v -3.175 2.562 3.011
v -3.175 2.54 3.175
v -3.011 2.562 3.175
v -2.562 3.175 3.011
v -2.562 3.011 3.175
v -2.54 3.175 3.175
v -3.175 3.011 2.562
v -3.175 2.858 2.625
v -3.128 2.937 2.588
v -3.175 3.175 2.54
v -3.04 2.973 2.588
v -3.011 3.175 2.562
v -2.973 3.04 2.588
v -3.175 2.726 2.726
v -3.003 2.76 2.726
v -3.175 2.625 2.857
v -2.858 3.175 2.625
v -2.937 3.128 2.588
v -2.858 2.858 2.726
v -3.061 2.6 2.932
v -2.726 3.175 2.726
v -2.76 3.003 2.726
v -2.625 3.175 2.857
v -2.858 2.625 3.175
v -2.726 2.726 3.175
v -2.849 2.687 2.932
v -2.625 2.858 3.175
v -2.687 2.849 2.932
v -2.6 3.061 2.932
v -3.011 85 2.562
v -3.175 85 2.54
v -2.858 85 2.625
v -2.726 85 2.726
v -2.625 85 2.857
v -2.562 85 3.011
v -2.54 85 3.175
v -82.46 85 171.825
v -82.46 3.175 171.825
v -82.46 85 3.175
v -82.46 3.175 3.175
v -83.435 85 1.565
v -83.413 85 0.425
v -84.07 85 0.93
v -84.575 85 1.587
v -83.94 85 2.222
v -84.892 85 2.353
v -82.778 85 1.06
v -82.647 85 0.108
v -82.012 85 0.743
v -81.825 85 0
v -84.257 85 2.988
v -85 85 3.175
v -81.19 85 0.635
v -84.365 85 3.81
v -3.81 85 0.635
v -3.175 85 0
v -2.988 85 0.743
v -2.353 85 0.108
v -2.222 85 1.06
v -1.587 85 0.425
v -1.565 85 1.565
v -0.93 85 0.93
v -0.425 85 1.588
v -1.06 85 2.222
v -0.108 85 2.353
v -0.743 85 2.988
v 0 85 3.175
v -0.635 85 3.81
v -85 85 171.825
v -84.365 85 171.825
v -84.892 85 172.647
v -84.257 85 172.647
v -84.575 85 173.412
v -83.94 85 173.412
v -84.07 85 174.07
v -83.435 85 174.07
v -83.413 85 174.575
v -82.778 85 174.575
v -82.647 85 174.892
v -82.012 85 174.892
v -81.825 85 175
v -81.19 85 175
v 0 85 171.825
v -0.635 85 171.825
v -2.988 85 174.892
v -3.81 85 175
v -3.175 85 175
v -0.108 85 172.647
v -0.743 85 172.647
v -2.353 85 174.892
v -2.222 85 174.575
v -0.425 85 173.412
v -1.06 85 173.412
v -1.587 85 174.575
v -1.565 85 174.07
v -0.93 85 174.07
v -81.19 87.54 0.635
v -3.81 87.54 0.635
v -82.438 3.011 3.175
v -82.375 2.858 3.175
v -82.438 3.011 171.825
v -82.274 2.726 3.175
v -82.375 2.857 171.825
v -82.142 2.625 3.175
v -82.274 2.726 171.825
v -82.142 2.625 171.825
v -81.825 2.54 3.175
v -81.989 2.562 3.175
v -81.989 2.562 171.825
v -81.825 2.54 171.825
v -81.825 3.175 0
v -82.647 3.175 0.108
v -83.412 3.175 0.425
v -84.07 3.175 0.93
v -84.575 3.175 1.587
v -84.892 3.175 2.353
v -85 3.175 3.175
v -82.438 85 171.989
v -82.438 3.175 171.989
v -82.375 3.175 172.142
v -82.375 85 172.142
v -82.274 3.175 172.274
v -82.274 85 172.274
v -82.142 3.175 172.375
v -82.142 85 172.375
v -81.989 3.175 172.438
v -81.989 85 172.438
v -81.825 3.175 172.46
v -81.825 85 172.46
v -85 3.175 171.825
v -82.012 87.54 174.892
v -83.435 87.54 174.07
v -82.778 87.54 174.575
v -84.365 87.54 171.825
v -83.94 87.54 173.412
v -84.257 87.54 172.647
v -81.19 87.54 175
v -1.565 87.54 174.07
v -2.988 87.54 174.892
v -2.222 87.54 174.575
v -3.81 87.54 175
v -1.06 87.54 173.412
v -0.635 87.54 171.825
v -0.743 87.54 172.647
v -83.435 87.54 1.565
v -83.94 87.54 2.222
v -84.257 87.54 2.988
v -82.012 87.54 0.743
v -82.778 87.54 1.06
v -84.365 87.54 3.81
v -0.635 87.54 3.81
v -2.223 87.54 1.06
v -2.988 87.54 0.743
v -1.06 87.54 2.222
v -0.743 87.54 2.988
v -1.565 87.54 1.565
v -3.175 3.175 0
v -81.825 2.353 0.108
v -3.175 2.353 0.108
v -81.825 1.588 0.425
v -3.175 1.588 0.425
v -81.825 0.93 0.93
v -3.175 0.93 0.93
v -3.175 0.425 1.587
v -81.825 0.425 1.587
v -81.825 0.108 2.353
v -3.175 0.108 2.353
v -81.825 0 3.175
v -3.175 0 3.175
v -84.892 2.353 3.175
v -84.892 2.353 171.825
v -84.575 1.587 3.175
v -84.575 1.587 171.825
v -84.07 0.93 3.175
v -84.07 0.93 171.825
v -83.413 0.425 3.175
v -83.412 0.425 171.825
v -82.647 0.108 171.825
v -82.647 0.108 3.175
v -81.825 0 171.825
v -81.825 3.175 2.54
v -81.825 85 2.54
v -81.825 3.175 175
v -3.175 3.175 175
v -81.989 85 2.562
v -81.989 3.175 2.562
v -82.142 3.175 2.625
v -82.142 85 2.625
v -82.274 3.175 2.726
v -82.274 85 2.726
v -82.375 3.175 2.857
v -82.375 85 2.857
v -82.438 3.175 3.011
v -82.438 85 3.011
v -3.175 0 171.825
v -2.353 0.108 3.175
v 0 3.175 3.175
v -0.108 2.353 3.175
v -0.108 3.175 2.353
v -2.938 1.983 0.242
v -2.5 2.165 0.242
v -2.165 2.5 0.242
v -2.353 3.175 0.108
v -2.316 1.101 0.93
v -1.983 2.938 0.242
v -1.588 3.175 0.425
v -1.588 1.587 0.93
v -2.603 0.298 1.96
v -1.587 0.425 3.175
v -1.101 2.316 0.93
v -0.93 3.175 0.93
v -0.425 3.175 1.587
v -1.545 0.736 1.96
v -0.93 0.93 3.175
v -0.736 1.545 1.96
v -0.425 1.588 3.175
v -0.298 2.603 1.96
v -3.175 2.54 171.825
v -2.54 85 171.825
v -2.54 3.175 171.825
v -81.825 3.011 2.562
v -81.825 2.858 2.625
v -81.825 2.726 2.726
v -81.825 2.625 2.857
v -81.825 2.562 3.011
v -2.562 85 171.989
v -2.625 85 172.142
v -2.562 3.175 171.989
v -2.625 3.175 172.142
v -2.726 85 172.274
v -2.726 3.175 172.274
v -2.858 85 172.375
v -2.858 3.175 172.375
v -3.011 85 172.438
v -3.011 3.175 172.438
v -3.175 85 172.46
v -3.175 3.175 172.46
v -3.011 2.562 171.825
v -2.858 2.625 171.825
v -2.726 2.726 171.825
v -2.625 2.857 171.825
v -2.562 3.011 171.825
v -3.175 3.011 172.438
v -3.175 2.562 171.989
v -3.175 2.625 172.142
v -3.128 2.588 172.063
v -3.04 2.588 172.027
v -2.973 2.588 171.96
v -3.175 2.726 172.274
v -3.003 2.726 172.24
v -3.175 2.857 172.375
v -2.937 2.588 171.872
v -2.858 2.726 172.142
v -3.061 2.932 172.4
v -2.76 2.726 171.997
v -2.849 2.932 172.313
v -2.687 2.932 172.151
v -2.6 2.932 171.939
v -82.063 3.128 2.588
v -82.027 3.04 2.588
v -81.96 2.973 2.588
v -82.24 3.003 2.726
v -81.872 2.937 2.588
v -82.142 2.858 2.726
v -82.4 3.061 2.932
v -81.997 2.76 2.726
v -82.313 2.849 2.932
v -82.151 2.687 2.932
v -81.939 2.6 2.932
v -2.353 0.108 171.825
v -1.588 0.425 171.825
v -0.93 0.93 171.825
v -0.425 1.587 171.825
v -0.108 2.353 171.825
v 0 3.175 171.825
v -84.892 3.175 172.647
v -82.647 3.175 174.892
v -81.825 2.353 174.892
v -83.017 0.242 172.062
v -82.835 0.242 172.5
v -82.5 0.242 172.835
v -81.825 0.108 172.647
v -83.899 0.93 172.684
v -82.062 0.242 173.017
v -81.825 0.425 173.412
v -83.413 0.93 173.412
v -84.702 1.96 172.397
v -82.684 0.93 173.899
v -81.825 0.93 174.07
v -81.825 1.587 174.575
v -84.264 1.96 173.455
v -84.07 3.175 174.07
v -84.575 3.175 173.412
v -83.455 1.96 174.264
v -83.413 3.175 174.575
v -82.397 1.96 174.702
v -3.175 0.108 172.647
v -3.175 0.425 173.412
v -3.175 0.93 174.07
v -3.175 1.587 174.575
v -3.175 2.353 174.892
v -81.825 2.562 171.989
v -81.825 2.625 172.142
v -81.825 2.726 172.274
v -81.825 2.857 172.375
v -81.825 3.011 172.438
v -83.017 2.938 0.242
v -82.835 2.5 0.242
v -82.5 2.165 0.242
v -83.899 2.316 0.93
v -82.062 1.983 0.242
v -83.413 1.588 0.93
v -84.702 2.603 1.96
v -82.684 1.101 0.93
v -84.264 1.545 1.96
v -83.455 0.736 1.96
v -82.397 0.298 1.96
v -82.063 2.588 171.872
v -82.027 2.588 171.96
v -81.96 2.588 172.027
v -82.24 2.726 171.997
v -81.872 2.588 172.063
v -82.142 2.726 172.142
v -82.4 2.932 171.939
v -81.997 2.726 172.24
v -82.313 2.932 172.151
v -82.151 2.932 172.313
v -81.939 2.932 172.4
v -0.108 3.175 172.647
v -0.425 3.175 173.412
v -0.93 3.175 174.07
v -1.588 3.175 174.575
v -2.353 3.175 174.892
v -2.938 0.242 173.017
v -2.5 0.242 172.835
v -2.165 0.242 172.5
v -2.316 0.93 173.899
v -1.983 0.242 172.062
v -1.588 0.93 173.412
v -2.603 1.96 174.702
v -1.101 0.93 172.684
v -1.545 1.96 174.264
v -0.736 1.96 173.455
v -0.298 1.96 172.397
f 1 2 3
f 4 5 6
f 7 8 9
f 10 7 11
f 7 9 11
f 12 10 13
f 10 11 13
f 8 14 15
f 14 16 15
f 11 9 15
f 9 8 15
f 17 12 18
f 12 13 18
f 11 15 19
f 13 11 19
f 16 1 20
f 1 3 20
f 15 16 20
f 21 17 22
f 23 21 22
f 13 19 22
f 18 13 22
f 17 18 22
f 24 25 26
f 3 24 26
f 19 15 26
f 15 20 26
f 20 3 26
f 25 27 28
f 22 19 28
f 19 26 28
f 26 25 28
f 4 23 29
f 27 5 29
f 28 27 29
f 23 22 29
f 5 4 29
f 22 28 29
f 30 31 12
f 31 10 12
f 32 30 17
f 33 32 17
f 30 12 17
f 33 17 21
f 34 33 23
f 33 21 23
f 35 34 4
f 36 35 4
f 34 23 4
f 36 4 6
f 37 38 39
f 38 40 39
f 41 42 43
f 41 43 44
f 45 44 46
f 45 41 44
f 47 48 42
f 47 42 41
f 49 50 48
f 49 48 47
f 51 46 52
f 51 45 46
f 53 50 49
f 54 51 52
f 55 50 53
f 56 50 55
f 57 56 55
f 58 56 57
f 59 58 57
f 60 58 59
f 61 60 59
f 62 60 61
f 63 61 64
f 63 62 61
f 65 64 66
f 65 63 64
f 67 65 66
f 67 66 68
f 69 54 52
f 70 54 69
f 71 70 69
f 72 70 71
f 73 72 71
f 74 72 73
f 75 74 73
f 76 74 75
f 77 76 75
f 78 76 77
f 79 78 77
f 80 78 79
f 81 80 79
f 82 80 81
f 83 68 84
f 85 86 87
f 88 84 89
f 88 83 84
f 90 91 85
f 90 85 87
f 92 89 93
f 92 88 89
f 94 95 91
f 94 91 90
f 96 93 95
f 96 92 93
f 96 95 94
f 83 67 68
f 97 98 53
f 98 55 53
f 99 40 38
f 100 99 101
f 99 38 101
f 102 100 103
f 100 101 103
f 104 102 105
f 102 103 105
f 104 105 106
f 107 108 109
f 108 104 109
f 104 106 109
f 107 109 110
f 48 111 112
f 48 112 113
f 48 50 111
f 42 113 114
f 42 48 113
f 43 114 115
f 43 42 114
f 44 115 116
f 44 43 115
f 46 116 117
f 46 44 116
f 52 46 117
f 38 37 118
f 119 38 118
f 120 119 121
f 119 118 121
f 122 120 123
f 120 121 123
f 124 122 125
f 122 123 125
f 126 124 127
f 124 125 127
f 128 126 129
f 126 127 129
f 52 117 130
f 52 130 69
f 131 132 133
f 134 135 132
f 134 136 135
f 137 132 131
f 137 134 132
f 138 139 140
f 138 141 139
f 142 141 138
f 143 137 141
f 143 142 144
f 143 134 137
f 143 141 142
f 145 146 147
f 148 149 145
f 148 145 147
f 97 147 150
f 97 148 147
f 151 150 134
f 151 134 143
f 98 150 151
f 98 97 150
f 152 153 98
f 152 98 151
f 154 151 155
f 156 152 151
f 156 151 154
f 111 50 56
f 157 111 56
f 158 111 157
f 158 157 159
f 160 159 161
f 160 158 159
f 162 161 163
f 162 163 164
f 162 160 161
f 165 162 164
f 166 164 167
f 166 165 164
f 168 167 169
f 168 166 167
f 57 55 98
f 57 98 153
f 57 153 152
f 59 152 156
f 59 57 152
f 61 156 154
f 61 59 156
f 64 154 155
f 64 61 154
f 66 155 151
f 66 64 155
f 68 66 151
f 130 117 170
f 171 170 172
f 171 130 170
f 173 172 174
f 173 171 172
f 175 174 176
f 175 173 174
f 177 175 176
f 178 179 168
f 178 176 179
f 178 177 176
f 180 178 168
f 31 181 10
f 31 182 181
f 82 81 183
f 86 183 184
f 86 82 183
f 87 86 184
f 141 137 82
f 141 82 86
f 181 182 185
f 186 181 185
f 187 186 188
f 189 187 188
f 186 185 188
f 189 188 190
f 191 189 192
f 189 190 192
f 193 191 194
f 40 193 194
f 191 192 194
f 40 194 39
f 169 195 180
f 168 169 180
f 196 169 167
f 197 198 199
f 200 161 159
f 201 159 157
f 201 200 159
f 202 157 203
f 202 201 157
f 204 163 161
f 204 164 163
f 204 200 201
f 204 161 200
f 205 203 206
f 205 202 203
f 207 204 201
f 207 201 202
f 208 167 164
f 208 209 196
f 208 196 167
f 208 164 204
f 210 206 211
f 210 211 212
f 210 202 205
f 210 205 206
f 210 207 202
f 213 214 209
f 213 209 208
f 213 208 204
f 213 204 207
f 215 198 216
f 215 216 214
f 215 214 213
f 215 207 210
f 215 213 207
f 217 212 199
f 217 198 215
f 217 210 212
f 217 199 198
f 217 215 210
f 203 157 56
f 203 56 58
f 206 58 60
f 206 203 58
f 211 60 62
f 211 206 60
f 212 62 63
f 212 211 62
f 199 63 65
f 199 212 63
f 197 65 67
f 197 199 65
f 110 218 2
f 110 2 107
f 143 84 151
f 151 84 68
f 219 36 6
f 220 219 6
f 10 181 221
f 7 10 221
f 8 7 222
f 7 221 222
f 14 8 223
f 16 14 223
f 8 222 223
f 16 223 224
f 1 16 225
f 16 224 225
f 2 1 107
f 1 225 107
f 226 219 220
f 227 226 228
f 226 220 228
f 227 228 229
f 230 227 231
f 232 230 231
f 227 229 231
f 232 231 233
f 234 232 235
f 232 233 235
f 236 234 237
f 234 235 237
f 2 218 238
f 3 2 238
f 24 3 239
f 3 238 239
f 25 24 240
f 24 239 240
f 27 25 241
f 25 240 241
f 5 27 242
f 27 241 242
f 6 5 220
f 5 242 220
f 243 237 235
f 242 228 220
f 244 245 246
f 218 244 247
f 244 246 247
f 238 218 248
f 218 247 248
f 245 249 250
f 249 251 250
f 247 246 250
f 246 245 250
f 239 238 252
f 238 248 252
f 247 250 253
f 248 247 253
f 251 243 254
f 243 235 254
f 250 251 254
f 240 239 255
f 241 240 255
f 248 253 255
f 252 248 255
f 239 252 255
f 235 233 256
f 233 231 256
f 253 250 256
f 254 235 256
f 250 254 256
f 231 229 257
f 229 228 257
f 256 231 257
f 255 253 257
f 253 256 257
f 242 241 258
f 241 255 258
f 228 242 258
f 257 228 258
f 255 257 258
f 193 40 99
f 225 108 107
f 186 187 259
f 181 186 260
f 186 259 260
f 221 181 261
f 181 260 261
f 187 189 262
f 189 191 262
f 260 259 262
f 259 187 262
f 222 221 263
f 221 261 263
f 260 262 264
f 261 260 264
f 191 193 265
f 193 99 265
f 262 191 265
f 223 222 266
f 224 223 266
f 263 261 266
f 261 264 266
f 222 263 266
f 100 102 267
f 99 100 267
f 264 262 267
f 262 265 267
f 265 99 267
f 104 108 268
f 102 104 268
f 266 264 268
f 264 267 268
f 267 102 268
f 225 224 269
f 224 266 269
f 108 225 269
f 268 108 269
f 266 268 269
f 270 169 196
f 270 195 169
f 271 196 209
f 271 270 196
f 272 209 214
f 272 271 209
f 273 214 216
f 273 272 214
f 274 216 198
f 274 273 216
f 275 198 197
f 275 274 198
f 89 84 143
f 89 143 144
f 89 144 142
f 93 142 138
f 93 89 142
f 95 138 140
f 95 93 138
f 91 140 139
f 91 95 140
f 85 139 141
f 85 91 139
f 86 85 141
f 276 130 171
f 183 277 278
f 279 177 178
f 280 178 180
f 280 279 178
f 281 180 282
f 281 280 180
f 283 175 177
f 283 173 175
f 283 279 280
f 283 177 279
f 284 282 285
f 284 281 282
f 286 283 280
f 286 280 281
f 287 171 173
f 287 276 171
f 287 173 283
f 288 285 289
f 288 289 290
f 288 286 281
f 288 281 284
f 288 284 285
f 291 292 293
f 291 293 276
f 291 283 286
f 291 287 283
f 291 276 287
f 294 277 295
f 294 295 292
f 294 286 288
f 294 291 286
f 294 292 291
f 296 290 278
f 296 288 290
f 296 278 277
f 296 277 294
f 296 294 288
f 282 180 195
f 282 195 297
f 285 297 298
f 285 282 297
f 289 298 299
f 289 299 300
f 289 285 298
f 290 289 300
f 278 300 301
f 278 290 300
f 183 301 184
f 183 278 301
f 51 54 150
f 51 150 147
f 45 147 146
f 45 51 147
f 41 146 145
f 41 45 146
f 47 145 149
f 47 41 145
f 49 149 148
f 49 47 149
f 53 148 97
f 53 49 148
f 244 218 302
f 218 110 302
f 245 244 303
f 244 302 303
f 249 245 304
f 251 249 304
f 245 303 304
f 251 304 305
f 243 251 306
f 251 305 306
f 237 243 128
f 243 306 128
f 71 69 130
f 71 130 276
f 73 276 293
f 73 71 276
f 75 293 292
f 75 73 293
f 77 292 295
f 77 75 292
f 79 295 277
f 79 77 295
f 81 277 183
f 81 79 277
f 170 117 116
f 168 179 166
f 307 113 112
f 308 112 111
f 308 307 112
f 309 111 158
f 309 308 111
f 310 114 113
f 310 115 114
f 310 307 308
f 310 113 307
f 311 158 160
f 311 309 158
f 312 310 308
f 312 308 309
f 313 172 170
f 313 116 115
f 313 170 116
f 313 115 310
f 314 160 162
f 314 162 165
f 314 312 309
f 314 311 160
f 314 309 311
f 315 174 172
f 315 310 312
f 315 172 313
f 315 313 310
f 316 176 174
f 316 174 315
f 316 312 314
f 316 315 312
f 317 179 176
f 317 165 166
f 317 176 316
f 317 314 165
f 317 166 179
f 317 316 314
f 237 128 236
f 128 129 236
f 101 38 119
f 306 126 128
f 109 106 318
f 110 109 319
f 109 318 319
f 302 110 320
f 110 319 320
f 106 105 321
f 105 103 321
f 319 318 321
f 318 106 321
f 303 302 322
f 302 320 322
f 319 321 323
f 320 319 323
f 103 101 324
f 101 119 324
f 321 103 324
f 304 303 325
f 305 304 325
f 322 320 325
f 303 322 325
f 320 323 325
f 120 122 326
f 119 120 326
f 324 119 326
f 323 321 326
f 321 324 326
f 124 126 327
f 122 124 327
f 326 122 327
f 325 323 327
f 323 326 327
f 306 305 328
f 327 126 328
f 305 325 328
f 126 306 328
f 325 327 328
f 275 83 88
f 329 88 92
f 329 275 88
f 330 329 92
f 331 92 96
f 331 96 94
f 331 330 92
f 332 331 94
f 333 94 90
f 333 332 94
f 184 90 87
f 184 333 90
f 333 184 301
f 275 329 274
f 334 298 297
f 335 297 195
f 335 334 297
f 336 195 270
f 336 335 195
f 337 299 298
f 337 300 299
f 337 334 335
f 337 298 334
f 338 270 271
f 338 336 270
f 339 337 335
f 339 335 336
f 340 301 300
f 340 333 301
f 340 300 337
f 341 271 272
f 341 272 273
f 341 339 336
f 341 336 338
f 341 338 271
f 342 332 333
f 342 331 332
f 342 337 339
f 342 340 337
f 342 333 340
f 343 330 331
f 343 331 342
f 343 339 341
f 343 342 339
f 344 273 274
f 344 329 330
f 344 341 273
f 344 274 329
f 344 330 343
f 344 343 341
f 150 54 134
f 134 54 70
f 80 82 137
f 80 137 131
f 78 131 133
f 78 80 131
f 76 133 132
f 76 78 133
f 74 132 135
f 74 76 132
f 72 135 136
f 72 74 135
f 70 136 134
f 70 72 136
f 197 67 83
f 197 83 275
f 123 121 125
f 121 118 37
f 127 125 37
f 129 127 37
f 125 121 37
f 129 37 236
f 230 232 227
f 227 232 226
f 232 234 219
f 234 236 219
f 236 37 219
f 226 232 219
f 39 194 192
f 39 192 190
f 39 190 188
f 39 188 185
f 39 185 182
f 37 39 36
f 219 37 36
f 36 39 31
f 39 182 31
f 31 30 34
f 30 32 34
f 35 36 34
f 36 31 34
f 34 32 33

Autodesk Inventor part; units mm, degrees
ref_plane "YZ Plane" through (0, 0, 0) normal (1, 0, 0) x (0, 1, 0)
ref_plane "XZ Plane" through (0, 0, 0) normal (0, 1, 0) x (-1, 0, 0)
ref_plane "XY Plane" through (0, 0, 0) normal (0, 0, 1) x (1, 0, 0)
sketch "Sketch1" plane through (0, 0, 0) normal (0, 0, 1) x (1, 0, 0)
  line L0 (0, 0) -> (-85, 0)
  line L1 (-85, 0) -> (-85, 85)
  line L2 (-85, 85) -> (0, 85)
  line L3 (0, 85) -> (0, 0)
  dimension "d0" = 85
  dimension "d1" = 85
extrude "Extrusion1" add sketch "Sketch1" along normal blind 175
fillet "Fillet2" radius 3.175 8 edges at (-85, 42.5, 175) (0, 42.5, 175) (-42.5, 0, 175) (-85, 0, 87.5) (0, 0, 87.5) (0, 42.5, 0) (-42.5, 0, 0) (-85, 42.5, 0)
shell "Shell1" thickness 2.54 removed faces 1 at (-28.3333, 85, 59.3917)
sketch "Sketch2" plane through (-81.825, 85, 0) normal (0, 1, 0) x (1, 0, 0)
  line L0 (-2.54, -175) -> (81.19, -175)
  line L1 (81.19, -175) -> (81.19, -0.635)
  line L2 (81.19, -0.635) -> (-2.54, -0.635)
  line L3 (-2.54, -0.635) -> (-2.54, -175)
  point P0 (81.825, 0)
  point P1 (0, -172.46)
  point P2 (78.65, -3.175)
extrude "Extrusion2" add sketch "Sketch2" along normal blind 2.54
fillet "Fillet3" radius 3.175 4 edges at (-84.365, 86.27, 175) (-0.635, 86.27, 175) (-0.635, 86.27, 0.635) (-84.365, 86.27, 0.635)
properties part number "AC_power_box" material "Iron, Cast"
